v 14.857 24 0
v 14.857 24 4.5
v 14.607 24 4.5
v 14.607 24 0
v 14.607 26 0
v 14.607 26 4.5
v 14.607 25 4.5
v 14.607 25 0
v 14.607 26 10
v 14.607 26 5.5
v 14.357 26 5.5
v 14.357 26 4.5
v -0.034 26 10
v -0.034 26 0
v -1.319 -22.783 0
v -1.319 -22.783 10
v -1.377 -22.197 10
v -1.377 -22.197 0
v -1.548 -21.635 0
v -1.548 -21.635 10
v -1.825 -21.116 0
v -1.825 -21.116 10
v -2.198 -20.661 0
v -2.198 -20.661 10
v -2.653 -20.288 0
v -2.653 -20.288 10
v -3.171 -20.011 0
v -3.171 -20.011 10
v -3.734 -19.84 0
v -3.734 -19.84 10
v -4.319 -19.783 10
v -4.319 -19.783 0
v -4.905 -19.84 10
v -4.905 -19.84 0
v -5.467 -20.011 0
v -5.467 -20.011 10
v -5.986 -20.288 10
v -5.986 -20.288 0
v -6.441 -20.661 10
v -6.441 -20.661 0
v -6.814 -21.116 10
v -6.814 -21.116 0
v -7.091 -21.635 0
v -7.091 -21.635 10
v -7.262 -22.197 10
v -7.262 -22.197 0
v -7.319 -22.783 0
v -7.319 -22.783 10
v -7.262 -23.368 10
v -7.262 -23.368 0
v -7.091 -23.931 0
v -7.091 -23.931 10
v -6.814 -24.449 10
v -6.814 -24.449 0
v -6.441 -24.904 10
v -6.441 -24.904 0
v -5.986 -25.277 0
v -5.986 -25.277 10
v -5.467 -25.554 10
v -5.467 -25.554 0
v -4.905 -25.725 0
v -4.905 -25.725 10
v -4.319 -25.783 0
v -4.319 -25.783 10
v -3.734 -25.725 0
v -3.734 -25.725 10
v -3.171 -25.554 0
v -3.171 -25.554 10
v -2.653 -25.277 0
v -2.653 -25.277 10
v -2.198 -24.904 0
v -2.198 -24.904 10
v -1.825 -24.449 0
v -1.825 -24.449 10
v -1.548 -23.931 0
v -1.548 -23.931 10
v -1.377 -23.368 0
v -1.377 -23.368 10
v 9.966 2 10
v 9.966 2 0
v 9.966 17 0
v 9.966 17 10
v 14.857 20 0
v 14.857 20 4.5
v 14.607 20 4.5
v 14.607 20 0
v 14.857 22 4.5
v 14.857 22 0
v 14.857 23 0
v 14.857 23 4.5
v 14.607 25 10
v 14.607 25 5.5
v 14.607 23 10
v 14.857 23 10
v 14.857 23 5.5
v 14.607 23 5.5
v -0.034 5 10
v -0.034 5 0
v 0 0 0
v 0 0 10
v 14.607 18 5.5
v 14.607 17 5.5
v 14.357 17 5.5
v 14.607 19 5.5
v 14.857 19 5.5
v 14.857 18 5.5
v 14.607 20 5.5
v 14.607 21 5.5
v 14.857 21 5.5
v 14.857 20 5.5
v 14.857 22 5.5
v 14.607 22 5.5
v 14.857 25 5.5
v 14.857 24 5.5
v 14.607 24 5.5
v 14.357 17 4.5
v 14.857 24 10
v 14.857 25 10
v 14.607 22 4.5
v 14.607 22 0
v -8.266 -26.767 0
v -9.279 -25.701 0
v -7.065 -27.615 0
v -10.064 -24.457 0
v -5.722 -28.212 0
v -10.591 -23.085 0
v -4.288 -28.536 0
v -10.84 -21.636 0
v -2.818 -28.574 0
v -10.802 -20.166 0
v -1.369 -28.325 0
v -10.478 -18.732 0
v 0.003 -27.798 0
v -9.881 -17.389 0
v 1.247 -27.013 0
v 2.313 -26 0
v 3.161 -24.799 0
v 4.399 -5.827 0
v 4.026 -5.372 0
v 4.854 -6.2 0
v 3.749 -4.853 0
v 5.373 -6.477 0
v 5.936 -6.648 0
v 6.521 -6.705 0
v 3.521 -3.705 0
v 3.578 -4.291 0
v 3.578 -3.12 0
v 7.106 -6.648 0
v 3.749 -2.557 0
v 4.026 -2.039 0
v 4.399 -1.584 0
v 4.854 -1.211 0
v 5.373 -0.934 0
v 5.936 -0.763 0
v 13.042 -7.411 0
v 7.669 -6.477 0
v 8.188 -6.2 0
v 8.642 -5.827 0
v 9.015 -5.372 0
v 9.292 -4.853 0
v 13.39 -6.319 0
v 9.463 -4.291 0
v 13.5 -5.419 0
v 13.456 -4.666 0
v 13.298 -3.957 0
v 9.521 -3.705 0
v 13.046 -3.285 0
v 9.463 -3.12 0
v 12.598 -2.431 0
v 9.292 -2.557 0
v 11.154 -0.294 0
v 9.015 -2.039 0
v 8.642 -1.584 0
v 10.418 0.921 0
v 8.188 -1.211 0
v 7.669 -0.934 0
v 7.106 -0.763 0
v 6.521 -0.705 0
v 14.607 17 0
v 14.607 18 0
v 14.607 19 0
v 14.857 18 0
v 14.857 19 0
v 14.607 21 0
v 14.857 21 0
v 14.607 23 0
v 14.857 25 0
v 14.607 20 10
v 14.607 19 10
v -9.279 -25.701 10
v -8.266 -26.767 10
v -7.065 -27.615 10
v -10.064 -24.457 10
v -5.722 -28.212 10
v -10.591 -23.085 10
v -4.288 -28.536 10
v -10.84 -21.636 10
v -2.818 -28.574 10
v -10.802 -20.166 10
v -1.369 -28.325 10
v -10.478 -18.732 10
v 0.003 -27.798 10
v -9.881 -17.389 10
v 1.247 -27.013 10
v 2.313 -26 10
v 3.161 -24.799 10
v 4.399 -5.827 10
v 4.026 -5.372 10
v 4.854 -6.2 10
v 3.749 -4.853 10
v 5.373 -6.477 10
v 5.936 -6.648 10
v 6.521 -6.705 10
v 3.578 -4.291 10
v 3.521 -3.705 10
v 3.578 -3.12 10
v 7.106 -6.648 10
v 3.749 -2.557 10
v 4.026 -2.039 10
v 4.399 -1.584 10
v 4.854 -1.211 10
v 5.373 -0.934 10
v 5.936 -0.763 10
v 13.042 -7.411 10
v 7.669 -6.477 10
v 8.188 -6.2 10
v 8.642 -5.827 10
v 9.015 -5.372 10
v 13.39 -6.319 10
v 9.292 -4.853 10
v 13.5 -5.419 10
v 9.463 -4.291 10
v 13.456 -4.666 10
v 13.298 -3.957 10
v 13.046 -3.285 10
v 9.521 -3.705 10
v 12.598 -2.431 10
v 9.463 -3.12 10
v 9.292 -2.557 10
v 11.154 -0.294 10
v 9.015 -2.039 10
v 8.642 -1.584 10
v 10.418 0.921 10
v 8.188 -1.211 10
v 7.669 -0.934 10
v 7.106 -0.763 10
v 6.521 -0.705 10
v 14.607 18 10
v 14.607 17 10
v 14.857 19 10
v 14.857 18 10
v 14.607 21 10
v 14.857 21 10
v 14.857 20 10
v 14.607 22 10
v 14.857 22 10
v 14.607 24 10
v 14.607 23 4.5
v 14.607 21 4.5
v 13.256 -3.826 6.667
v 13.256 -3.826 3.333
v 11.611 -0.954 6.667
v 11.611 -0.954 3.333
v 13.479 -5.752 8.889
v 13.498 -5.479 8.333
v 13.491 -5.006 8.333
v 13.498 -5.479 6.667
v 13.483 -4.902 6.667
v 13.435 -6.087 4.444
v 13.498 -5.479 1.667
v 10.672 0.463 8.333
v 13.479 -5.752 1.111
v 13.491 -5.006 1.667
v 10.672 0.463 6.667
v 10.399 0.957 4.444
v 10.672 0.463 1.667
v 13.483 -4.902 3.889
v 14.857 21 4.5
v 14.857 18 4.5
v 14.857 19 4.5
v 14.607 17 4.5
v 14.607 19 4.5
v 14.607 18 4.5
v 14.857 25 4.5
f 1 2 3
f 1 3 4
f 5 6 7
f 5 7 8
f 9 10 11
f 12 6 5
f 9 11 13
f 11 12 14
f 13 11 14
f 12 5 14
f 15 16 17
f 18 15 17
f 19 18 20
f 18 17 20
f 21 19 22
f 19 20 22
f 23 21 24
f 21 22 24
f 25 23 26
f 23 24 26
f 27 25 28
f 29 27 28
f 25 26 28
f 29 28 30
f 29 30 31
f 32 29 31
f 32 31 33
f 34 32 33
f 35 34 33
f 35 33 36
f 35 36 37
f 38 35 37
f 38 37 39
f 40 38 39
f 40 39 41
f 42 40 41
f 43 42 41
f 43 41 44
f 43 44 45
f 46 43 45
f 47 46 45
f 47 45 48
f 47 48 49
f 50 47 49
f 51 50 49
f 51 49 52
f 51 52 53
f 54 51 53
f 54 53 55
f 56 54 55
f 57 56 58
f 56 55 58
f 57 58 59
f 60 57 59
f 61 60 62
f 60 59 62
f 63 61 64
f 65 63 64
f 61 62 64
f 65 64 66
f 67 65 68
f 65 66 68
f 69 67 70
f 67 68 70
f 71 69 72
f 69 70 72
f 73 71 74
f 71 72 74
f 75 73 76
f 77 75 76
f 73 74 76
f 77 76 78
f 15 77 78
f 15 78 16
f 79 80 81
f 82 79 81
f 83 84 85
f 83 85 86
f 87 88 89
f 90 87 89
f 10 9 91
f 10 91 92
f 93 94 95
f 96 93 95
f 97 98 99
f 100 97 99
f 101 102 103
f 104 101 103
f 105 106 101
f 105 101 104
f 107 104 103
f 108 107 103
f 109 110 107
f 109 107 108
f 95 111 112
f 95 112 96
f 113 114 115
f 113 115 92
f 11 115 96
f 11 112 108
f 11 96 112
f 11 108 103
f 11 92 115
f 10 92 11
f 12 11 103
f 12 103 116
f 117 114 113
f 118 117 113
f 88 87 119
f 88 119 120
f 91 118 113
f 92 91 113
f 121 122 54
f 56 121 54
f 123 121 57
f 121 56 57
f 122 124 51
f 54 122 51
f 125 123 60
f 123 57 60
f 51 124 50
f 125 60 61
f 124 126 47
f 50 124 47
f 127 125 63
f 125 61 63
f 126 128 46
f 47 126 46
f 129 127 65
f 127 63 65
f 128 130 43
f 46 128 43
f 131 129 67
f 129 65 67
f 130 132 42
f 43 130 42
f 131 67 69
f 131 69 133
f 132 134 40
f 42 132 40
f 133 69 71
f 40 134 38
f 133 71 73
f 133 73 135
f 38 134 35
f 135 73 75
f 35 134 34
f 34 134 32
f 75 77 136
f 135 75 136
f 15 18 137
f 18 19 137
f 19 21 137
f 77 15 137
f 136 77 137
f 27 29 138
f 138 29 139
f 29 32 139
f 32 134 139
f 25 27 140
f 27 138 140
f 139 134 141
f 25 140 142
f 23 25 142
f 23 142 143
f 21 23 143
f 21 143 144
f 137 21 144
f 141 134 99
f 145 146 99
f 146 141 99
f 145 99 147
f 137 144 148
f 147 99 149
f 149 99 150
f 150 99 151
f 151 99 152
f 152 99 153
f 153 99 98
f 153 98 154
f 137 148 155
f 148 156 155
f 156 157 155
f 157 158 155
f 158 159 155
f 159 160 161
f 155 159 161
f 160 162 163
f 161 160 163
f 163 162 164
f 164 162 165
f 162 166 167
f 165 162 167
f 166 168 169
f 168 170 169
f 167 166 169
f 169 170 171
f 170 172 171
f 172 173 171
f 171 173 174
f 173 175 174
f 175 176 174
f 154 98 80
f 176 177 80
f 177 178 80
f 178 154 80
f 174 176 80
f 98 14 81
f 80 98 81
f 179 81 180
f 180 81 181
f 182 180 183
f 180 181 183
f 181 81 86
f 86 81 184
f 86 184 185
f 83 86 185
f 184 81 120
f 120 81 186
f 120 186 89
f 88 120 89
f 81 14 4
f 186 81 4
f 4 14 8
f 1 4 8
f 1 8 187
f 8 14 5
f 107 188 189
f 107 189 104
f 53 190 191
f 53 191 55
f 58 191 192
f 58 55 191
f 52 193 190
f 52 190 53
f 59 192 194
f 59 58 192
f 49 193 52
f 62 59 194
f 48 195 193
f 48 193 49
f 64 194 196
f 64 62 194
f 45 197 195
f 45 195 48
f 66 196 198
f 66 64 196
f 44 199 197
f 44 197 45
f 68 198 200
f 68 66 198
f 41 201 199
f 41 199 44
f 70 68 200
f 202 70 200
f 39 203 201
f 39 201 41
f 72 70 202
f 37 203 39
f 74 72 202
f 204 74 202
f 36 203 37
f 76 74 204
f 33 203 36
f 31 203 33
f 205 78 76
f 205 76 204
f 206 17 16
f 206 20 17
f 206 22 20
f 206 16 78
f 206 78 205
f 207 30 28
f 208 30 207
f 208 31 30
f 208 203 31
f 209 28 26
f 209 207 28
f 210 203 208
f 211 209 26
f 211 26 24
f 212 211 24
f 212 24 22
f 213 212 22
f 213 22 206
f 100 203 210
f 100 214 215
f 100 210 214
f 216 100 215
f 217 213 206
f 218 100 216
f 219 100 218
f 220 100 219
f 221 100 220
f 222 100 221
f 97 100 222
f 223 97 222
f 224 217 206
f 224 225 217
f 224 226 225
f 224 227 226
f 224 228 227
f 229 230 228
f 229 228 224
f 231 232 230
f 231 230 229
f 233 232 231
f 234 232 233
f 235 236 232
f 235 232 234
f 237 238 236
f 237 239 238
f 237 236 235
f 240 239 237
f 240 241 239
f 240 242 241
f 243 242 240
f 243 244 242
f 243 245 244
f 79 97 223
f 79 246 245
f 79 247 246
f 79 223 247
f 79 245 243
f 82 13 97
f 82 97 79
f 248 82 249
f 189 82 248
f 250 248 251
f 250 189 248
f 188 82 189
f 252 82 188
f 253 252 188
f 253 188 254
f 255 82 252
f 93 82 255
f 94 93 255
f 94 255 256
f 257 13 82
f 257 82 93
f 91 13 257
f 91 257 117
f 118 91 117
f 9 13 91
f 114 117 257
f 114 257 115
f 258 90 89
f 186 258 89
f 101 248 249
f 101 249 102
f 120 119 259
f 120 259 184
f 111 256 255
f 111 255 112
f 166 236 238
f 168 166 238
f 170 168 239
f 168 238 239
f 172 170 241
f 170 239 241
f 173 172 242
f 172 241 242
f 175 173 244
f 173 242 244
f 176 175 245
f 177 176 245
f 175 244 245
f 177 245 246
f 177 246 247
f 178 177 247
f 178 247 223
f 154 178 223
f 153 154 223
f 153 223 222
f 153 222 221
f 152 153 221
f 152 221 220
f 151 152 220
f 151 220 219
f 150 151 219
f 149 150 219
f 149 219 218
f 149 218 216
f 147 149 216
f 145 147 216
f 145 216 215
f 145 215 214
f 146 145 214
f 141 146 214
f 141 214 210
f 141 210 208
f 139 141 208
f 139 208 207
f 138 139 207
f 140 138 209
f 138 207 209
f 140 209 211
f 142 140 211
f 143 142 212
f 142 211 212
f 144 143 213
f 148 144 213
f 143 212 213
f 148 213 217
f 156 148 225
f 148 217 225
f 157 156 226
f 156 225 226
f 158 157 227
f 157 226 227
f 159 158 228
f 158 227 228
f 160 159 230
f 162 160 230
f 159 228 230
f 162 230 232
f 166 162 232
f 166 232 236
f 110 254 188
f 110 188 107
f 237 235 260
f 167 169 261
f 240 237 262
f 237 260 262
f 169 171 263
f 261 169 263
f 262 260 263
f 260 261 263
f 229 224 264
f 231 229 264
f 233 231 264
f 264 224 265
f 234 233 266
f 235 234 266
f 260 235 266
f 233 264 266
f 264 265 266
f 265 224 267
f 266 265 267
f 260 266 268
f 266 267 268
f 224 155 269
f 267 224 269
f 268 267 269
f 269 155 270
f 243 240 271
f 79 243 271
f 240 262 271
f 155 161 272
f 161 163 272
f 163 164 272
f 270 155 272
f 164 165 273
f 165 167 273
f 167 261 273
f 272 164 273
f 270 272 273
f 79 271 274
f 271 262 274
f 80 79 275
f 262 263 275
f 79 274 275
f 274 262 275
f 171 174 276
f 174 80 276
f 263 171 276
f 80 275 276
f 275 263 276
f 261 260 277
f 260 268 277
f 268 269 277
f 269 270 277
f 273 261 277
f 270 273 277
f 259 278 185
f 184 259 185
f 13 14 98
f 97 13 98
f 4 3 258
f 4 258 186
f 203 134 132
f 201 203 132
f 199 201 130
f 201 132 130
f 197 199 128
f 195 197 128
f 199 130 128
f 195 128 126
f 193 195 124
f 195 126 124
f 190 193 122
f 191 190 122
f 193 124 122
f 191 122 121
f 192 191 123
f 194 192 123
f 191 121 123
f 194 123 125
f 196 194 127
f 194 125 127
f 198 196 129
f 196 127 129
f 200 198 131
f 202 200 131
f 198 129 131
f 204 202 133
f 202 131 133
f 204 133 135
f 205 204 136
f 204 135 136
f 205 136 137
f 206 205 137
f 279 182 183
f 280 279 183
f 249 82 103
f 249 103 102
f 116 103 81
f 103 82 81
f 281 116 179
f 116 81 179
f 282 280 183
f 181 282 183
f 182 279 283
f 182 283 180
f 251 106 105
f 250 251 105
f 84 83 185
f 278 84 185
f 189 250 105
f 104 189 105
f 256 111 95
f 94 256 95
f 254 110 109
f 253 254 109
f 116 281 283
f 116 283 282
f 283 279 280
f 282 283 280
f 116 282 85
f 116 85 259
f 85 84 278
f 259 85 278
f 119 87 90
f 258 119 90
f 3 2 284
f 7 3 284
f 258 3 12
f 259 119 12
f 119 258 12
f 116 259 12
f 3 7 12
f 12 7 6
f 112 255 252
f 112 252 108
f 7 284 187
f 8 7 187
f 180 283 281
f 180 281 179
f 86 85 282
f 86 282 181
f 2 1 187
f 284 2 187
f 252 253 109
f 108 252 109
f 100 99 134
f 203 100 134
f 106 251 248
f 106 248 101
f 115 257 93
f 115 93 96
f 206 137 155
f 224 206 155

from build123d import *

# Parameters (mm, degrees)
BOSS_EXTRUDE1_DEPTH = 10
SKETCH2_W           = 1
SKETCH2_H           = 9
CUT_EXTRUDE1_DEPTH  = 0.5
SKETCH4_W           = 4.5
SKETCH4_H           = 1
CUT_EXTRUDE4_DEPTH  = 0.25
SKETCH5_W           = 4.5
SKETCH5_H           = 1
CUT_EXTRUDE5_DEPTH  = 0.25
SKETCH6_R           = 3
CUT_EXTRUDE6_DEPTH  = 34.739405243


with BuildPart() as part:
    # Sketch1 → Boss-Extrude1 (new body)
    with BuildSketch(Plane.XY):
        with BuildLine():
            Line((0, 0), (-9.88076328, -17.388804358))
            ThreePointArc((-9.88076328, -17.388804358), (-7.065247876, -27.614892222), (3.160839988, -24.799376818))
            Line((3.160839988, -24.799376818), (13.041603269, -7.41057246))
            add(Edge.make_bspline(
                [(13.041603269, -7.41057246), (14.806349741, -3.203268527), (10.991774611, -1.261774485), (9.965646647, 2)],
                knots=[0, 0, 0, 0, 1, 1, 1, 1], degree=3))
            Line((9.965646647, 2), (9.965646647, 17))
            Line((9.965646647, 17), (14.856831388, 17))
            Line((14.856831388, 17), (14.856831388, 26))
            Line((14.856831388, 26), (-0.034353353, 26))
            Line((-0.034353353, 26), (-0.034353353, 15))
            Line((-0.034353353, 15), (-0.034353353, 5))
            Line((-0.034353353, 5), (0, 0))
        make_face()
    extrude(amount=BOSS_EXTRUDE1_DEPTH)

    # Sketch2 → Cut-Extrude1 (cut)
    with BuildSketch(Plane(origin=(14.856831388, 0, 0), x_dir=(0, 0, -1), z_dir=(1, 0, 0))):
        with Locations((-5, 21.5)):
            Rectangle(SKETCH2_W, SKETCH2_H)
    extrude(amount=-CUT_EXTRUDE1_DEPTH, mode=Mode.SUBTRACT)

    # Sketch4 → Cut-Extrude4 (cut)
    with BuildSketch(Plane(origin=(14.856831388, 0, 0), x_dir=(0, 0, -1), z_dir=(1, 0, 0))):
        with Locations((-7.75, 17.5)):
            Rectangle(SKETCH4_W, SKETCH4_H)
        with Locations((-7.75, 19.5)):
            Rectangle(SKETCH4_W, SKETCH4_H)
        with Locations((-7.75, 21.5)):
            Rectangle(SKETCH4_W, SKETCH4_H)
        with Locations((-7.75, 23.5)):
            Rectangle(SKETCH4_W, SKETCH4_H)
        with Locations((-7.75, 25.5)):
            Rectangle(SKETCH4_W, SKETCH4_H)
    extrude(amount=-CUT_EXTRUDE4_DEPTH, mode=Mode.SUBTRACT)

    # Sketch5 → Cut-Extrude5 (cut)
    with BuildSketch(Plane(origin=(14.856831388, 0, 0), x_dir=(0, 0, -1), z_dir=(1, 0, 0))):
        with Locations((-2.25, 17.5)):
            Rectangle(SKETCH5_W, SKETCH5_H)
        with Locations((-2.25, 19.5)):
            Rectangle(SKETCH5_W, SKETCH5_H)
        with Locations((-2.25, 21.5)):
            Rectangle(SKETCH5_W, SKETCH5_H)
        with Locations((-2.25, 23.5)):
            Rectangle(SKETCH5_W, SKETCH5_H)
        with Locations((-2.25, 25.5)):
            Rectangle(SKETCH5_W, SKETCH5_H)
    extrude(amount=-CUT_EXTRUDE5_DEPTH, mode=Mode.SUBTRACT)

    # Sketch6 → Cut-Extrude6 (cut, through all)
    with BuildSketch(Plane.XY.offset(10)):
        with Locations((-4.31940135, -22.782574446)):
            Circle(SKETCH6_R)
        with Locations((6.520801634, -3.70528623)):
            Circle(SKETCH6_R)
    extrude(amount=-CUT_EXTRUDE6_DEPTH, mode=Mode.SUBTRACT)


solid = part.part
